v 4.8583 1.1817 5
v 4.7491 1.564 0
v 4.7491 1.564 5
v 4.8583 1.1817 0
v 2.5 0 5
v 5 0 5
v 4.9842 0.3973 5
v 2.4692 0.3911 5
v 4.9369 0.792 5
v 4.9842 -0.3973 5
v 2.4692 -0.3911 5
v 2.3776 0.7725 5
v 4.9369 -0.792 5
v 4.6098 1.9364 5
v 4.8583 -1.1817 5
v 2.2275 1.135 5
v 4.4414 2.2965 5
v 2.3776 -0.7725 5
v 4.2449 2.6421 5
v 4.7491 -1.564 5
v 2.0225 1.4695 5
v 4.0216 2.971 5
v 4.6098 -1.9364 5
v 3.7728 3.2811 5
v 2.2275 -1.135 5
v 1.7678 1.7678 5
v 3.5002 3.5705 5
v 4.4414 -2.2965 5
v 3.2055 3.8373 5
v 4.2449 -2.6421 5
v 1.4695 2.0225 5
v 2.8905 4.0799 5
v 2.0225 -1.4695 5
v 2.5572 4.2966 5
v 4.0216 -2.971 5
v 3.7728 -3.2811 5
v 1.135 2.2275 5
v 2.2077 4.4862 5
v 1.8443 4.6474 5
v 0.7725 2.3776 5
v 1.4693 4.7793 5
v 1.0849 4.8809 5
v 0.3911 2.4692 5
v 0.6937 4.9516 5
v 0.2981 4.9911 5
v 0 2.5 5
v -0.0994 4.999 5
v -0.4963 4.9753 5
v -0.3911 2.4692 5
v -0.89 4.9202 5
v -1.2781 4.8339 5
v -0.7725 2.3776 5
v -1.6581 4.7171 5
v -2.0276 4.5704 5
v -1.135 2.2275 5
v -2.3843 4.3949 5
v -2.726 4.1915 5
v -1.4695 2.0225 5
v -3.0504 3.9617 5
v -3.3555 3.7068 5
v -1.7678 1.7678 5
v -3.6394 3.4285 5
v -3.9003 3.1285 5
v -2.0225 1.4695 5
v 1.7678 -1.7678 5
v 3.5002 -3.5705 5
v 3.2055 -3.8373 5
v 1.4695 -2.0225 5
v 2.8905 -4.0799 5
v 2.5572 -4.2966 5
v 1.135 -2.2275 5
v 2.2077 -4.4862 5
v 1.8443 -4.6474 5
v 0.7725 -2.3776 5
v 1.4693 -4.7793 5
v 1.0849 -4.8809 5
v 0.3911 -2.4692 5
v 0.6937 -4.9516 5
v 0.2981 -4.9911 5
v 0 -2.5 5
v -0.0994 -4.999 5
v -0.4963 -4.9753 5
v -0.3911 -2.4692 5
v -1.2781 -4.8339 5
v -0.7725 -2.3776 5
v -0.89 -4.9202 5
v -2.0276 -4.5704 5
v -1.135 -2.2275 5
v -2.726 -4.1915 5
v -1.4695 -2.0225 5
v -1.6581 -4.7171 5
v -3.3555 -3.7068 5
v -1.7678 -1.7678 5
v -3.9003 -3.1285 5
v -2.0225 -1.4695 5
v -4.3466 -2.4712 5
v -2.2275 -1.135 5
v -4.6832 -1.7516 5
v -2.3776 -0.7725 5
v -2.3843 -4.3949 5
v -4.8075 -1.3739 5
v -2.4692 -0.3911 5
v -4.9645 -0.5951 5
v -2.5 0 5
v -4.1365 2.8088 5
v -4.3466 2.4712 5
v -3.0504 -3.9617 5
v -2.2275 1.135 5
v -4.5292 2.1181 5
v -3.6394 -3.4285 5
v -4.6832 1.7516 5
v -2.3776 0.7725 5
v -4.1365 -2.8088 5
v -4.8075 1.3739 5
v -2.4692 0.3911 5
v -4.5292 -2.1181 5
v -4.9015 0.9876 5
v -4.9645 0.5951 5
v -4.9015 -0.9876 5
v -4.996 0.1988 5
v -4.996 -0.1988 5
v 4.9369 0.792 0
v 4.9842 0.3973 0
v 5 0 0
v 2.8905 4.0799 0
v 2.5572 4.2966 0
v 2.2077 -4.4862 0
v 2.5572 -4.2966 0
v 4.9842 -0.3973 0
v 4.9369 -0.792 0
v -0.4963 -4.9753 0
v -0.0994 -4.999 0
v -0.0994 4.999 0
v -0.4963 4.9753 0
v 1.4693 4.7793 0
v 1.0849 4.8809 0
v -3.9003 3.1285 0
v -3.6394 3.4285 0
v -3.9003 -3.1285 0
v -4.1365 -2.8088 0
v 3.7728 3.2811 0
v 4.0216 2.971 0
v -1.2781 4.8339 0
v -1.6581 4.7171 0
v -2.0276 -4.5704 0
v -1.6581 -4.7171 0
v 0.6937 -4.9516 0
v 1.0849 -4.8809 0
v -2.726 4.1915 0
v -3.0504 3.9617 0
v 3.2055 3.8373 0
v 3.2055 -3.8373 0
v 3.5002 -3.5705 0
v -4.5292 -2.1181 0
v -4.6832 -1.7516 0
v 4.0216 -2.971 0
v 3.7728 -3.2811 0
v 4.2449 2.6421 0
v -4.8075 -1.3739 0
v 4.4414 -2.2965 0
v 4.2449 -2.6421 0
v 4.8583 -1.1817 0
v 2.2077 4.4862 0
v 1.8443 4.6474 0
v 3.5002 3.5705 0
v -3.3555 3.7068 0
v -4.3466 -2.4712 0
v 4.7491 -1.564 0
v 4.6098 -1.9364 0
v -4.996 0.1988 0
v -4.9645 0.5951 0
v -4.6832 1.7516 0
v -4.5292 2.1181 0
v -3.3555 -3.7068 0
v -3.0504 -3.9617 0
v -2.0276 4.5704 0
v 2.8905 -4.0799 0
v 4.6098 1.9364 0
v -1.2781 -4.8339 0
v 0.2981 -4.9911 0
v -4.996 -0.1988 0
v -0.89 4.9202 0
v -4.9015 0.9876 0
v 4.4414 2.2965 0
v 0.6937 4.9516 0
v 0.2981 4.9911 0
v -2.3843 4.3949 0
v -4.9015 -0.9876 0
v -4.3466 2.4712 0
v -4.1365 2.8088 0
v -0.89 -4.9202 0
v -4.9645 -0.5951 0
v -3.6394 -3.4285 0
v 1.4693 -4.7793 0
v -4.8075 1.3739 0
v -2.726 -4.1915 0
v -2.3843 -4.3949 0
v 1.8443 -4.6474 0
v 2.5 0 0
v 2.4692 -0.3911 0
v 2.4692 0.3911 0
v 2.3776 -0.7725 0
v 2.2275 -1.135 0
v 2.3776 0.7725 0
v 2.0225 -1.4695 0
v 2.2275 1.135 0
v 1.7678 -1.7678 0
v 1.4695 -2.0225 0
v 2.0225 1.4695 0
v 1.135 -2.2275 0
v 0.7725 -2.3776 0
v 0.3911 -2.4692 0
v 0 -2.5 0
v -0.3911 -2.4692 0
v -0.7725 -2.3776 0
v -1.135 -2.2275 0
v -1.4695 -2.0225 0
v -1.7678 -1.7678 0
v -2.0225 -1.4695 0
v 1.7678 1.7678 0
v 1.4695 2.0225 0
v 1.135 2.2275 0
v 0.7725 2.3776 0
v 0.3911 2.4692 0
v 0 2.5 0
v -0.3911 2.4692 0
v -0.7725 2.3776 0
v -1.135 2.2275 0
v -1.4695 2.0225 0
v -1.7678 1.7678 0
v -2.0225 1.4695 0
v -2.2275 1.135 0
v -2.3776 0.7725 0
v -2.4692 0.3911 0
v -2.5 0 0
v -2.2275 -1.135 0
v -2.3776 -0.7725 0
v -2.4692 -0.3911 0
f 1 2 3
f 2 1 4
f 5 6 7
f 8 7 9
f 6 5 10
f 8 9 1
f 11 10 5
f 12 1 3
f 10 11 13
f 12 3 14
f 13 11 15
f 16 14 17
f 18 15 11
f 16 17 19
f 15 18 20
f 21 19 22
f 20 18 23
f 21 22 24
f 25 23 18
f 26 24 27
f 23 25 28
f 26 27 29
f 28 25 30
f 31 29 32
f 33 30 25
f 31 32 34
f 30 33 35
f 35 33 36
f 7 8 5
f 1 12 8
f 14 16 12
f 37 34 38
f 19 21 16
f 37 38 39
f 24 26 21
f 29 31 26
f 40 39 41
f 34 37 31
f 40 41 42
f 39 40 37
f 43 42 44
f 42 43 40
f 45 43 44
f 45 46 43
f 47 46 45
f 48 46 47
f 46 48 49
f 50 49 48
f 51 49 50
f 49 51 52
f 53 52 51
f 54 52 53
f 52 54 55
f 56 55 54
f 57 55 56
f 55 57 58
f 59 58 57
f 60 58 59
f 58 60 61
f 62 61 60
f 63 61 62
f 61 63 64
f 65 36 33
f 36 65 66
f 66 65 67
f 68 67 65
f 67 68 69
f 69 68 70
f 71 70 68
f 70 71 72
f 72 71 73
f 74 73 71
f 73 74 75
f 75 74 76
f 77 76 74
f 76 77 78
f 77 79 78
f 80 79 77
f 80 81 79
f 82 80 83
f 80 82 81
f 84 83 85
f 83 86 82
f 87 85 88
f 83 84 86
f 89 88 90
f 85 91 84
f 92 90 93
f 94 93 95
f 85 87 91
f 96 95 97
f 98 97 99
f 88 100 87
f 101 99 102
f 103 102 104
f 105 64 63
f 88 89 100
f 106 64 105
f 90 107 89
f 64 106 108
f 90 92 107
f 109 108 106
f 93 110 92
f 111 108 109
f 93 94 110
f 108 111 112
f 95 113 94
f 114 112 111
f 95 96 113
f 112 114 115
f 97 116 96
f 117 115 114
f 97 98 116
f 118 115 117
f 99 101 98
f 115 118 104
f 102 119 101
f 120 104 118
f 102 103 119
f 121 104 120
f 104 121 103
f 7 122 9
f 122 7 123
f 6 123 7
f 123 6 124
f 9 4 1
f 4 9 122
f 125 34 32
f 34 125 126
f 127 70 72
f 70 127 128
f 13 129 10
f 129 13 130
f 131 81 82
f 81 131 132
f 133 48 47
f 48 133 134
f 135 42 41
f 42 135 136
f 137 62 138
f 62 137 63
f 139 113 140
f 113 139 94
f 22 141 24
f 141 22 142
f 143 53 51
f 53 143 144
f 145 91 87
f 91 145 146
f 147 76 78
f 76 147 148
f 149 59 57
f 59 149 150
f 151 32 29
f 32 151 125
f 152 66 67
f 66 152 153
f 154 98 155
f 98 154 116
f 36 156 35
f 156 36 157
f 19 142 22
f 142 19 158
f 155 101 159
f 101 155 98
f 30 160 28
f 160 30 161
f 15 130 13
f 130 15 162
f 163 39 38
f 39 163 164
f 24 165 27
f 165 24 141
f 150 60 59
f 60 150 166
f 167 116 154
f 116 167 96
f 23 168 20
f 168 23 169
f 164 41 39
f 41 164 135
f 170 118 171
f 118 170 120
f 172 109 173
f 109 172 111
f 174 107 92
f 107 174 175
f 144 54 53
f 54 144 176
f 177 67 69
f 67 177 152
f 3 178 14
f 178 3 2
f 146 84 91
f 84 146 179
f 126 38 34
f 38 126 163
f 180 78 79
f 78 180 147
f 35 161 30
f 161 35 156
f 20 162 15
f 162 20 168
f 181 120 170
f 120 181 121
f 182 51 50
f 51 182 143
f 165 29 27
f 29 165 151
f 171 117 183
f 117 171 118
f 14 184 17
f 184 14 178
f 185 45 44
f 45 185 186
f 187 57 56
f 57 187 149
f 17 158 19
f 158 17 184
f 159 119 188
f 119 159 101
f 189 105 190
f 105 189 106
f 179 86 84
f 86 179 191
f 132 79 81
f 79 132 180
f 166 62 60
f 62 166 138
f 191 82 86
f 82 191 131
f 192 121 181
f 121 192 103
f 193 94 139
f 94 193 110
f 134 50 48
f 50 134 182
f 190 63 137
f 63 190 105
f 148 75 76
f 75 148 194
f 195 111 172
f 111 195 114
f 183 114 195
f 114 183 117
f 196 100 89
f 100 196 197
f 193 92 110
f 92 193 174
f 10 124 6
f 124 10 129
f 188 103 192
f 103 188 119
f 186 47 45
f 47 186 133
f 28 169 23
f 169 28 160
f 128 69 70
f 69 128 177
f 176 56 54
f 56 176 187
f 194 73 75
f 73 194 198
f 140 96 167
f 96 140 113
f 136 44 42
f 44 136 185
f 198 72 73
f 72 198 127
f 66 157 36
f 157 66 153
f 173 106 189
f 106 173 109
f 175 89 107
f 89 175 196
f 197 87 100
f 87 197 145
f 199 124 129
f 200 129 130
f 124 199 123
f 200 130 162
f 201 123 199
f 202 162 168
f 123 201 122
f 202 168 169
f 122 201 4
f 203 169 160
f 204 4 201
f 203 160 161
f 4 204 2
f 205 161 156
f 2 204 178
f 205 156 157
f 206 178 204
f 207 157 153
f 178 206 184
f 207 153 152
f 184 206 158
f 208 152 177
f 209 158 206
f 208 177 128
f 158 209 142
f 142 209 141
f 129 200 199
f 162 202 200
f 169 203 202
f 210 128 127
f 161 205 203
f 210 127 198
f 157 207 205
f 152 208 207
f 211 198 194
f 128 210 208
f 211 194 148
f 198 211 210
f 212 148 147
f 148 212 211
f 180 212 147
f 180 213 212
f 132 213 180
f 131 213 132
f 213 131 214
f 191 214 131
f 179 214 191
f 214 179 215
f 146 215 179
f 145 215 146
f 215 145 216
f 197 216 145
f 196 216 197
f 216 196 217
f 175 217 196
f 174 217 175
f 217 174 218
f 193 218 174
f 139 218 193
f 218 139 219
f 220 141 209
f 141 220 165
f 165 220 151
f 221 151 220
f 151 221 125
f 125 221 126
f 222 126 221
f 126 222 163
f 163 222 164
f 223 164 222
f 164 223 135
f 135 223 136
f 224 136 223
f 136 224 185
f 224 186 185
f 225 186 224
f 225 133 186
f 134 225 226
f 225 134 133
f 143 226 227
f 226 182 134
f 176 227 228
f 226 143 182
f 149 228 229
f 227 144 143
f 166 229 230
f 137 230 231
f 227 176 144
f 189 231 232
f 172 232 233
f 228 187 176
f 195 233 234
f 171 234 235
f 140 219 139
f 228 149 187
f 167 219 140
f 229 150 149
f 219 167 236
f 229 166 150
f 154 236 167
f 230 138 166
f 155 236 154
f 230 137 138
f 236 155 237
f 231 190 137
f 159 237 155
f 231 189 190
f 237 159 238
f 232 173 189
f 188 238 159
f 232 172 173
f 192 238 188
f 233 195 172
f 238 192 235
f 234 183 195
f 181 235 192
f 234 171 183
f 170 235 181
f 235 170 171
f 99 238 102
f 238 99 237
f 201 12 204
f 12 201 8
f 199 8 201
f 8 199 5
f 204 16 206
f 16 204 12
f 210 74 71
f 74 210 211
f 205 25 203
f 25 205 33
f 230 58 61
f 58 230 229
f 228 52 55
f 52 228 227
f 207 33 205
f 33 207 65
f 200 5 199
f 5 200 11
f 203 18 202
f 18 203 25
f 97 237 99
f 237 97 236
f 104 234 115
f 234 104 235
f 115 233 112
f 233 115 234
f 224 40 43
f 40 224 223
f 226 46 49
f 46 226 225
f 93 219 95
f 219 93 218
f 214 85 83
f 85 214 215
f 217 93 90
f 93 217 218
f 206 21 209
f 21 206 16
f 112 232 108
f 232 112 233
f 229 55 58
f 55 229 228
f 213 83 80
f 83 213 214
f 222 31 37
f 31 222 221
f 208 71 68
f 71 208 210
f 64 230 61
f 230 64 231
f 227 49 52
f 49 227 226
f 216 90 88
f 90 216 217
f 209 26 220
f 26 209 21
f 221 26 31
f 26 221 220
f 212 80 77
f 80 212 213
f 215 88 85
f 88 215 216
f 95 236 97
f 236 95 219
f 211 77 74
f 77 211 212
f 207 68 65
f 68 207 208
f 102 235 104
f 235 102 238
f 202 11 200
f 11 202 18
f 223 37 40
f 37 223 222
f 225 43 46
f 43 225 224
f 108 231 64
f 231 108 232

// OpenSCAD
$fa=1;
$fs=0.4;
difference() {
cylinder(h=5, r=5,center=false);
cylinder(h=5, r=2.5,center=false);
}
